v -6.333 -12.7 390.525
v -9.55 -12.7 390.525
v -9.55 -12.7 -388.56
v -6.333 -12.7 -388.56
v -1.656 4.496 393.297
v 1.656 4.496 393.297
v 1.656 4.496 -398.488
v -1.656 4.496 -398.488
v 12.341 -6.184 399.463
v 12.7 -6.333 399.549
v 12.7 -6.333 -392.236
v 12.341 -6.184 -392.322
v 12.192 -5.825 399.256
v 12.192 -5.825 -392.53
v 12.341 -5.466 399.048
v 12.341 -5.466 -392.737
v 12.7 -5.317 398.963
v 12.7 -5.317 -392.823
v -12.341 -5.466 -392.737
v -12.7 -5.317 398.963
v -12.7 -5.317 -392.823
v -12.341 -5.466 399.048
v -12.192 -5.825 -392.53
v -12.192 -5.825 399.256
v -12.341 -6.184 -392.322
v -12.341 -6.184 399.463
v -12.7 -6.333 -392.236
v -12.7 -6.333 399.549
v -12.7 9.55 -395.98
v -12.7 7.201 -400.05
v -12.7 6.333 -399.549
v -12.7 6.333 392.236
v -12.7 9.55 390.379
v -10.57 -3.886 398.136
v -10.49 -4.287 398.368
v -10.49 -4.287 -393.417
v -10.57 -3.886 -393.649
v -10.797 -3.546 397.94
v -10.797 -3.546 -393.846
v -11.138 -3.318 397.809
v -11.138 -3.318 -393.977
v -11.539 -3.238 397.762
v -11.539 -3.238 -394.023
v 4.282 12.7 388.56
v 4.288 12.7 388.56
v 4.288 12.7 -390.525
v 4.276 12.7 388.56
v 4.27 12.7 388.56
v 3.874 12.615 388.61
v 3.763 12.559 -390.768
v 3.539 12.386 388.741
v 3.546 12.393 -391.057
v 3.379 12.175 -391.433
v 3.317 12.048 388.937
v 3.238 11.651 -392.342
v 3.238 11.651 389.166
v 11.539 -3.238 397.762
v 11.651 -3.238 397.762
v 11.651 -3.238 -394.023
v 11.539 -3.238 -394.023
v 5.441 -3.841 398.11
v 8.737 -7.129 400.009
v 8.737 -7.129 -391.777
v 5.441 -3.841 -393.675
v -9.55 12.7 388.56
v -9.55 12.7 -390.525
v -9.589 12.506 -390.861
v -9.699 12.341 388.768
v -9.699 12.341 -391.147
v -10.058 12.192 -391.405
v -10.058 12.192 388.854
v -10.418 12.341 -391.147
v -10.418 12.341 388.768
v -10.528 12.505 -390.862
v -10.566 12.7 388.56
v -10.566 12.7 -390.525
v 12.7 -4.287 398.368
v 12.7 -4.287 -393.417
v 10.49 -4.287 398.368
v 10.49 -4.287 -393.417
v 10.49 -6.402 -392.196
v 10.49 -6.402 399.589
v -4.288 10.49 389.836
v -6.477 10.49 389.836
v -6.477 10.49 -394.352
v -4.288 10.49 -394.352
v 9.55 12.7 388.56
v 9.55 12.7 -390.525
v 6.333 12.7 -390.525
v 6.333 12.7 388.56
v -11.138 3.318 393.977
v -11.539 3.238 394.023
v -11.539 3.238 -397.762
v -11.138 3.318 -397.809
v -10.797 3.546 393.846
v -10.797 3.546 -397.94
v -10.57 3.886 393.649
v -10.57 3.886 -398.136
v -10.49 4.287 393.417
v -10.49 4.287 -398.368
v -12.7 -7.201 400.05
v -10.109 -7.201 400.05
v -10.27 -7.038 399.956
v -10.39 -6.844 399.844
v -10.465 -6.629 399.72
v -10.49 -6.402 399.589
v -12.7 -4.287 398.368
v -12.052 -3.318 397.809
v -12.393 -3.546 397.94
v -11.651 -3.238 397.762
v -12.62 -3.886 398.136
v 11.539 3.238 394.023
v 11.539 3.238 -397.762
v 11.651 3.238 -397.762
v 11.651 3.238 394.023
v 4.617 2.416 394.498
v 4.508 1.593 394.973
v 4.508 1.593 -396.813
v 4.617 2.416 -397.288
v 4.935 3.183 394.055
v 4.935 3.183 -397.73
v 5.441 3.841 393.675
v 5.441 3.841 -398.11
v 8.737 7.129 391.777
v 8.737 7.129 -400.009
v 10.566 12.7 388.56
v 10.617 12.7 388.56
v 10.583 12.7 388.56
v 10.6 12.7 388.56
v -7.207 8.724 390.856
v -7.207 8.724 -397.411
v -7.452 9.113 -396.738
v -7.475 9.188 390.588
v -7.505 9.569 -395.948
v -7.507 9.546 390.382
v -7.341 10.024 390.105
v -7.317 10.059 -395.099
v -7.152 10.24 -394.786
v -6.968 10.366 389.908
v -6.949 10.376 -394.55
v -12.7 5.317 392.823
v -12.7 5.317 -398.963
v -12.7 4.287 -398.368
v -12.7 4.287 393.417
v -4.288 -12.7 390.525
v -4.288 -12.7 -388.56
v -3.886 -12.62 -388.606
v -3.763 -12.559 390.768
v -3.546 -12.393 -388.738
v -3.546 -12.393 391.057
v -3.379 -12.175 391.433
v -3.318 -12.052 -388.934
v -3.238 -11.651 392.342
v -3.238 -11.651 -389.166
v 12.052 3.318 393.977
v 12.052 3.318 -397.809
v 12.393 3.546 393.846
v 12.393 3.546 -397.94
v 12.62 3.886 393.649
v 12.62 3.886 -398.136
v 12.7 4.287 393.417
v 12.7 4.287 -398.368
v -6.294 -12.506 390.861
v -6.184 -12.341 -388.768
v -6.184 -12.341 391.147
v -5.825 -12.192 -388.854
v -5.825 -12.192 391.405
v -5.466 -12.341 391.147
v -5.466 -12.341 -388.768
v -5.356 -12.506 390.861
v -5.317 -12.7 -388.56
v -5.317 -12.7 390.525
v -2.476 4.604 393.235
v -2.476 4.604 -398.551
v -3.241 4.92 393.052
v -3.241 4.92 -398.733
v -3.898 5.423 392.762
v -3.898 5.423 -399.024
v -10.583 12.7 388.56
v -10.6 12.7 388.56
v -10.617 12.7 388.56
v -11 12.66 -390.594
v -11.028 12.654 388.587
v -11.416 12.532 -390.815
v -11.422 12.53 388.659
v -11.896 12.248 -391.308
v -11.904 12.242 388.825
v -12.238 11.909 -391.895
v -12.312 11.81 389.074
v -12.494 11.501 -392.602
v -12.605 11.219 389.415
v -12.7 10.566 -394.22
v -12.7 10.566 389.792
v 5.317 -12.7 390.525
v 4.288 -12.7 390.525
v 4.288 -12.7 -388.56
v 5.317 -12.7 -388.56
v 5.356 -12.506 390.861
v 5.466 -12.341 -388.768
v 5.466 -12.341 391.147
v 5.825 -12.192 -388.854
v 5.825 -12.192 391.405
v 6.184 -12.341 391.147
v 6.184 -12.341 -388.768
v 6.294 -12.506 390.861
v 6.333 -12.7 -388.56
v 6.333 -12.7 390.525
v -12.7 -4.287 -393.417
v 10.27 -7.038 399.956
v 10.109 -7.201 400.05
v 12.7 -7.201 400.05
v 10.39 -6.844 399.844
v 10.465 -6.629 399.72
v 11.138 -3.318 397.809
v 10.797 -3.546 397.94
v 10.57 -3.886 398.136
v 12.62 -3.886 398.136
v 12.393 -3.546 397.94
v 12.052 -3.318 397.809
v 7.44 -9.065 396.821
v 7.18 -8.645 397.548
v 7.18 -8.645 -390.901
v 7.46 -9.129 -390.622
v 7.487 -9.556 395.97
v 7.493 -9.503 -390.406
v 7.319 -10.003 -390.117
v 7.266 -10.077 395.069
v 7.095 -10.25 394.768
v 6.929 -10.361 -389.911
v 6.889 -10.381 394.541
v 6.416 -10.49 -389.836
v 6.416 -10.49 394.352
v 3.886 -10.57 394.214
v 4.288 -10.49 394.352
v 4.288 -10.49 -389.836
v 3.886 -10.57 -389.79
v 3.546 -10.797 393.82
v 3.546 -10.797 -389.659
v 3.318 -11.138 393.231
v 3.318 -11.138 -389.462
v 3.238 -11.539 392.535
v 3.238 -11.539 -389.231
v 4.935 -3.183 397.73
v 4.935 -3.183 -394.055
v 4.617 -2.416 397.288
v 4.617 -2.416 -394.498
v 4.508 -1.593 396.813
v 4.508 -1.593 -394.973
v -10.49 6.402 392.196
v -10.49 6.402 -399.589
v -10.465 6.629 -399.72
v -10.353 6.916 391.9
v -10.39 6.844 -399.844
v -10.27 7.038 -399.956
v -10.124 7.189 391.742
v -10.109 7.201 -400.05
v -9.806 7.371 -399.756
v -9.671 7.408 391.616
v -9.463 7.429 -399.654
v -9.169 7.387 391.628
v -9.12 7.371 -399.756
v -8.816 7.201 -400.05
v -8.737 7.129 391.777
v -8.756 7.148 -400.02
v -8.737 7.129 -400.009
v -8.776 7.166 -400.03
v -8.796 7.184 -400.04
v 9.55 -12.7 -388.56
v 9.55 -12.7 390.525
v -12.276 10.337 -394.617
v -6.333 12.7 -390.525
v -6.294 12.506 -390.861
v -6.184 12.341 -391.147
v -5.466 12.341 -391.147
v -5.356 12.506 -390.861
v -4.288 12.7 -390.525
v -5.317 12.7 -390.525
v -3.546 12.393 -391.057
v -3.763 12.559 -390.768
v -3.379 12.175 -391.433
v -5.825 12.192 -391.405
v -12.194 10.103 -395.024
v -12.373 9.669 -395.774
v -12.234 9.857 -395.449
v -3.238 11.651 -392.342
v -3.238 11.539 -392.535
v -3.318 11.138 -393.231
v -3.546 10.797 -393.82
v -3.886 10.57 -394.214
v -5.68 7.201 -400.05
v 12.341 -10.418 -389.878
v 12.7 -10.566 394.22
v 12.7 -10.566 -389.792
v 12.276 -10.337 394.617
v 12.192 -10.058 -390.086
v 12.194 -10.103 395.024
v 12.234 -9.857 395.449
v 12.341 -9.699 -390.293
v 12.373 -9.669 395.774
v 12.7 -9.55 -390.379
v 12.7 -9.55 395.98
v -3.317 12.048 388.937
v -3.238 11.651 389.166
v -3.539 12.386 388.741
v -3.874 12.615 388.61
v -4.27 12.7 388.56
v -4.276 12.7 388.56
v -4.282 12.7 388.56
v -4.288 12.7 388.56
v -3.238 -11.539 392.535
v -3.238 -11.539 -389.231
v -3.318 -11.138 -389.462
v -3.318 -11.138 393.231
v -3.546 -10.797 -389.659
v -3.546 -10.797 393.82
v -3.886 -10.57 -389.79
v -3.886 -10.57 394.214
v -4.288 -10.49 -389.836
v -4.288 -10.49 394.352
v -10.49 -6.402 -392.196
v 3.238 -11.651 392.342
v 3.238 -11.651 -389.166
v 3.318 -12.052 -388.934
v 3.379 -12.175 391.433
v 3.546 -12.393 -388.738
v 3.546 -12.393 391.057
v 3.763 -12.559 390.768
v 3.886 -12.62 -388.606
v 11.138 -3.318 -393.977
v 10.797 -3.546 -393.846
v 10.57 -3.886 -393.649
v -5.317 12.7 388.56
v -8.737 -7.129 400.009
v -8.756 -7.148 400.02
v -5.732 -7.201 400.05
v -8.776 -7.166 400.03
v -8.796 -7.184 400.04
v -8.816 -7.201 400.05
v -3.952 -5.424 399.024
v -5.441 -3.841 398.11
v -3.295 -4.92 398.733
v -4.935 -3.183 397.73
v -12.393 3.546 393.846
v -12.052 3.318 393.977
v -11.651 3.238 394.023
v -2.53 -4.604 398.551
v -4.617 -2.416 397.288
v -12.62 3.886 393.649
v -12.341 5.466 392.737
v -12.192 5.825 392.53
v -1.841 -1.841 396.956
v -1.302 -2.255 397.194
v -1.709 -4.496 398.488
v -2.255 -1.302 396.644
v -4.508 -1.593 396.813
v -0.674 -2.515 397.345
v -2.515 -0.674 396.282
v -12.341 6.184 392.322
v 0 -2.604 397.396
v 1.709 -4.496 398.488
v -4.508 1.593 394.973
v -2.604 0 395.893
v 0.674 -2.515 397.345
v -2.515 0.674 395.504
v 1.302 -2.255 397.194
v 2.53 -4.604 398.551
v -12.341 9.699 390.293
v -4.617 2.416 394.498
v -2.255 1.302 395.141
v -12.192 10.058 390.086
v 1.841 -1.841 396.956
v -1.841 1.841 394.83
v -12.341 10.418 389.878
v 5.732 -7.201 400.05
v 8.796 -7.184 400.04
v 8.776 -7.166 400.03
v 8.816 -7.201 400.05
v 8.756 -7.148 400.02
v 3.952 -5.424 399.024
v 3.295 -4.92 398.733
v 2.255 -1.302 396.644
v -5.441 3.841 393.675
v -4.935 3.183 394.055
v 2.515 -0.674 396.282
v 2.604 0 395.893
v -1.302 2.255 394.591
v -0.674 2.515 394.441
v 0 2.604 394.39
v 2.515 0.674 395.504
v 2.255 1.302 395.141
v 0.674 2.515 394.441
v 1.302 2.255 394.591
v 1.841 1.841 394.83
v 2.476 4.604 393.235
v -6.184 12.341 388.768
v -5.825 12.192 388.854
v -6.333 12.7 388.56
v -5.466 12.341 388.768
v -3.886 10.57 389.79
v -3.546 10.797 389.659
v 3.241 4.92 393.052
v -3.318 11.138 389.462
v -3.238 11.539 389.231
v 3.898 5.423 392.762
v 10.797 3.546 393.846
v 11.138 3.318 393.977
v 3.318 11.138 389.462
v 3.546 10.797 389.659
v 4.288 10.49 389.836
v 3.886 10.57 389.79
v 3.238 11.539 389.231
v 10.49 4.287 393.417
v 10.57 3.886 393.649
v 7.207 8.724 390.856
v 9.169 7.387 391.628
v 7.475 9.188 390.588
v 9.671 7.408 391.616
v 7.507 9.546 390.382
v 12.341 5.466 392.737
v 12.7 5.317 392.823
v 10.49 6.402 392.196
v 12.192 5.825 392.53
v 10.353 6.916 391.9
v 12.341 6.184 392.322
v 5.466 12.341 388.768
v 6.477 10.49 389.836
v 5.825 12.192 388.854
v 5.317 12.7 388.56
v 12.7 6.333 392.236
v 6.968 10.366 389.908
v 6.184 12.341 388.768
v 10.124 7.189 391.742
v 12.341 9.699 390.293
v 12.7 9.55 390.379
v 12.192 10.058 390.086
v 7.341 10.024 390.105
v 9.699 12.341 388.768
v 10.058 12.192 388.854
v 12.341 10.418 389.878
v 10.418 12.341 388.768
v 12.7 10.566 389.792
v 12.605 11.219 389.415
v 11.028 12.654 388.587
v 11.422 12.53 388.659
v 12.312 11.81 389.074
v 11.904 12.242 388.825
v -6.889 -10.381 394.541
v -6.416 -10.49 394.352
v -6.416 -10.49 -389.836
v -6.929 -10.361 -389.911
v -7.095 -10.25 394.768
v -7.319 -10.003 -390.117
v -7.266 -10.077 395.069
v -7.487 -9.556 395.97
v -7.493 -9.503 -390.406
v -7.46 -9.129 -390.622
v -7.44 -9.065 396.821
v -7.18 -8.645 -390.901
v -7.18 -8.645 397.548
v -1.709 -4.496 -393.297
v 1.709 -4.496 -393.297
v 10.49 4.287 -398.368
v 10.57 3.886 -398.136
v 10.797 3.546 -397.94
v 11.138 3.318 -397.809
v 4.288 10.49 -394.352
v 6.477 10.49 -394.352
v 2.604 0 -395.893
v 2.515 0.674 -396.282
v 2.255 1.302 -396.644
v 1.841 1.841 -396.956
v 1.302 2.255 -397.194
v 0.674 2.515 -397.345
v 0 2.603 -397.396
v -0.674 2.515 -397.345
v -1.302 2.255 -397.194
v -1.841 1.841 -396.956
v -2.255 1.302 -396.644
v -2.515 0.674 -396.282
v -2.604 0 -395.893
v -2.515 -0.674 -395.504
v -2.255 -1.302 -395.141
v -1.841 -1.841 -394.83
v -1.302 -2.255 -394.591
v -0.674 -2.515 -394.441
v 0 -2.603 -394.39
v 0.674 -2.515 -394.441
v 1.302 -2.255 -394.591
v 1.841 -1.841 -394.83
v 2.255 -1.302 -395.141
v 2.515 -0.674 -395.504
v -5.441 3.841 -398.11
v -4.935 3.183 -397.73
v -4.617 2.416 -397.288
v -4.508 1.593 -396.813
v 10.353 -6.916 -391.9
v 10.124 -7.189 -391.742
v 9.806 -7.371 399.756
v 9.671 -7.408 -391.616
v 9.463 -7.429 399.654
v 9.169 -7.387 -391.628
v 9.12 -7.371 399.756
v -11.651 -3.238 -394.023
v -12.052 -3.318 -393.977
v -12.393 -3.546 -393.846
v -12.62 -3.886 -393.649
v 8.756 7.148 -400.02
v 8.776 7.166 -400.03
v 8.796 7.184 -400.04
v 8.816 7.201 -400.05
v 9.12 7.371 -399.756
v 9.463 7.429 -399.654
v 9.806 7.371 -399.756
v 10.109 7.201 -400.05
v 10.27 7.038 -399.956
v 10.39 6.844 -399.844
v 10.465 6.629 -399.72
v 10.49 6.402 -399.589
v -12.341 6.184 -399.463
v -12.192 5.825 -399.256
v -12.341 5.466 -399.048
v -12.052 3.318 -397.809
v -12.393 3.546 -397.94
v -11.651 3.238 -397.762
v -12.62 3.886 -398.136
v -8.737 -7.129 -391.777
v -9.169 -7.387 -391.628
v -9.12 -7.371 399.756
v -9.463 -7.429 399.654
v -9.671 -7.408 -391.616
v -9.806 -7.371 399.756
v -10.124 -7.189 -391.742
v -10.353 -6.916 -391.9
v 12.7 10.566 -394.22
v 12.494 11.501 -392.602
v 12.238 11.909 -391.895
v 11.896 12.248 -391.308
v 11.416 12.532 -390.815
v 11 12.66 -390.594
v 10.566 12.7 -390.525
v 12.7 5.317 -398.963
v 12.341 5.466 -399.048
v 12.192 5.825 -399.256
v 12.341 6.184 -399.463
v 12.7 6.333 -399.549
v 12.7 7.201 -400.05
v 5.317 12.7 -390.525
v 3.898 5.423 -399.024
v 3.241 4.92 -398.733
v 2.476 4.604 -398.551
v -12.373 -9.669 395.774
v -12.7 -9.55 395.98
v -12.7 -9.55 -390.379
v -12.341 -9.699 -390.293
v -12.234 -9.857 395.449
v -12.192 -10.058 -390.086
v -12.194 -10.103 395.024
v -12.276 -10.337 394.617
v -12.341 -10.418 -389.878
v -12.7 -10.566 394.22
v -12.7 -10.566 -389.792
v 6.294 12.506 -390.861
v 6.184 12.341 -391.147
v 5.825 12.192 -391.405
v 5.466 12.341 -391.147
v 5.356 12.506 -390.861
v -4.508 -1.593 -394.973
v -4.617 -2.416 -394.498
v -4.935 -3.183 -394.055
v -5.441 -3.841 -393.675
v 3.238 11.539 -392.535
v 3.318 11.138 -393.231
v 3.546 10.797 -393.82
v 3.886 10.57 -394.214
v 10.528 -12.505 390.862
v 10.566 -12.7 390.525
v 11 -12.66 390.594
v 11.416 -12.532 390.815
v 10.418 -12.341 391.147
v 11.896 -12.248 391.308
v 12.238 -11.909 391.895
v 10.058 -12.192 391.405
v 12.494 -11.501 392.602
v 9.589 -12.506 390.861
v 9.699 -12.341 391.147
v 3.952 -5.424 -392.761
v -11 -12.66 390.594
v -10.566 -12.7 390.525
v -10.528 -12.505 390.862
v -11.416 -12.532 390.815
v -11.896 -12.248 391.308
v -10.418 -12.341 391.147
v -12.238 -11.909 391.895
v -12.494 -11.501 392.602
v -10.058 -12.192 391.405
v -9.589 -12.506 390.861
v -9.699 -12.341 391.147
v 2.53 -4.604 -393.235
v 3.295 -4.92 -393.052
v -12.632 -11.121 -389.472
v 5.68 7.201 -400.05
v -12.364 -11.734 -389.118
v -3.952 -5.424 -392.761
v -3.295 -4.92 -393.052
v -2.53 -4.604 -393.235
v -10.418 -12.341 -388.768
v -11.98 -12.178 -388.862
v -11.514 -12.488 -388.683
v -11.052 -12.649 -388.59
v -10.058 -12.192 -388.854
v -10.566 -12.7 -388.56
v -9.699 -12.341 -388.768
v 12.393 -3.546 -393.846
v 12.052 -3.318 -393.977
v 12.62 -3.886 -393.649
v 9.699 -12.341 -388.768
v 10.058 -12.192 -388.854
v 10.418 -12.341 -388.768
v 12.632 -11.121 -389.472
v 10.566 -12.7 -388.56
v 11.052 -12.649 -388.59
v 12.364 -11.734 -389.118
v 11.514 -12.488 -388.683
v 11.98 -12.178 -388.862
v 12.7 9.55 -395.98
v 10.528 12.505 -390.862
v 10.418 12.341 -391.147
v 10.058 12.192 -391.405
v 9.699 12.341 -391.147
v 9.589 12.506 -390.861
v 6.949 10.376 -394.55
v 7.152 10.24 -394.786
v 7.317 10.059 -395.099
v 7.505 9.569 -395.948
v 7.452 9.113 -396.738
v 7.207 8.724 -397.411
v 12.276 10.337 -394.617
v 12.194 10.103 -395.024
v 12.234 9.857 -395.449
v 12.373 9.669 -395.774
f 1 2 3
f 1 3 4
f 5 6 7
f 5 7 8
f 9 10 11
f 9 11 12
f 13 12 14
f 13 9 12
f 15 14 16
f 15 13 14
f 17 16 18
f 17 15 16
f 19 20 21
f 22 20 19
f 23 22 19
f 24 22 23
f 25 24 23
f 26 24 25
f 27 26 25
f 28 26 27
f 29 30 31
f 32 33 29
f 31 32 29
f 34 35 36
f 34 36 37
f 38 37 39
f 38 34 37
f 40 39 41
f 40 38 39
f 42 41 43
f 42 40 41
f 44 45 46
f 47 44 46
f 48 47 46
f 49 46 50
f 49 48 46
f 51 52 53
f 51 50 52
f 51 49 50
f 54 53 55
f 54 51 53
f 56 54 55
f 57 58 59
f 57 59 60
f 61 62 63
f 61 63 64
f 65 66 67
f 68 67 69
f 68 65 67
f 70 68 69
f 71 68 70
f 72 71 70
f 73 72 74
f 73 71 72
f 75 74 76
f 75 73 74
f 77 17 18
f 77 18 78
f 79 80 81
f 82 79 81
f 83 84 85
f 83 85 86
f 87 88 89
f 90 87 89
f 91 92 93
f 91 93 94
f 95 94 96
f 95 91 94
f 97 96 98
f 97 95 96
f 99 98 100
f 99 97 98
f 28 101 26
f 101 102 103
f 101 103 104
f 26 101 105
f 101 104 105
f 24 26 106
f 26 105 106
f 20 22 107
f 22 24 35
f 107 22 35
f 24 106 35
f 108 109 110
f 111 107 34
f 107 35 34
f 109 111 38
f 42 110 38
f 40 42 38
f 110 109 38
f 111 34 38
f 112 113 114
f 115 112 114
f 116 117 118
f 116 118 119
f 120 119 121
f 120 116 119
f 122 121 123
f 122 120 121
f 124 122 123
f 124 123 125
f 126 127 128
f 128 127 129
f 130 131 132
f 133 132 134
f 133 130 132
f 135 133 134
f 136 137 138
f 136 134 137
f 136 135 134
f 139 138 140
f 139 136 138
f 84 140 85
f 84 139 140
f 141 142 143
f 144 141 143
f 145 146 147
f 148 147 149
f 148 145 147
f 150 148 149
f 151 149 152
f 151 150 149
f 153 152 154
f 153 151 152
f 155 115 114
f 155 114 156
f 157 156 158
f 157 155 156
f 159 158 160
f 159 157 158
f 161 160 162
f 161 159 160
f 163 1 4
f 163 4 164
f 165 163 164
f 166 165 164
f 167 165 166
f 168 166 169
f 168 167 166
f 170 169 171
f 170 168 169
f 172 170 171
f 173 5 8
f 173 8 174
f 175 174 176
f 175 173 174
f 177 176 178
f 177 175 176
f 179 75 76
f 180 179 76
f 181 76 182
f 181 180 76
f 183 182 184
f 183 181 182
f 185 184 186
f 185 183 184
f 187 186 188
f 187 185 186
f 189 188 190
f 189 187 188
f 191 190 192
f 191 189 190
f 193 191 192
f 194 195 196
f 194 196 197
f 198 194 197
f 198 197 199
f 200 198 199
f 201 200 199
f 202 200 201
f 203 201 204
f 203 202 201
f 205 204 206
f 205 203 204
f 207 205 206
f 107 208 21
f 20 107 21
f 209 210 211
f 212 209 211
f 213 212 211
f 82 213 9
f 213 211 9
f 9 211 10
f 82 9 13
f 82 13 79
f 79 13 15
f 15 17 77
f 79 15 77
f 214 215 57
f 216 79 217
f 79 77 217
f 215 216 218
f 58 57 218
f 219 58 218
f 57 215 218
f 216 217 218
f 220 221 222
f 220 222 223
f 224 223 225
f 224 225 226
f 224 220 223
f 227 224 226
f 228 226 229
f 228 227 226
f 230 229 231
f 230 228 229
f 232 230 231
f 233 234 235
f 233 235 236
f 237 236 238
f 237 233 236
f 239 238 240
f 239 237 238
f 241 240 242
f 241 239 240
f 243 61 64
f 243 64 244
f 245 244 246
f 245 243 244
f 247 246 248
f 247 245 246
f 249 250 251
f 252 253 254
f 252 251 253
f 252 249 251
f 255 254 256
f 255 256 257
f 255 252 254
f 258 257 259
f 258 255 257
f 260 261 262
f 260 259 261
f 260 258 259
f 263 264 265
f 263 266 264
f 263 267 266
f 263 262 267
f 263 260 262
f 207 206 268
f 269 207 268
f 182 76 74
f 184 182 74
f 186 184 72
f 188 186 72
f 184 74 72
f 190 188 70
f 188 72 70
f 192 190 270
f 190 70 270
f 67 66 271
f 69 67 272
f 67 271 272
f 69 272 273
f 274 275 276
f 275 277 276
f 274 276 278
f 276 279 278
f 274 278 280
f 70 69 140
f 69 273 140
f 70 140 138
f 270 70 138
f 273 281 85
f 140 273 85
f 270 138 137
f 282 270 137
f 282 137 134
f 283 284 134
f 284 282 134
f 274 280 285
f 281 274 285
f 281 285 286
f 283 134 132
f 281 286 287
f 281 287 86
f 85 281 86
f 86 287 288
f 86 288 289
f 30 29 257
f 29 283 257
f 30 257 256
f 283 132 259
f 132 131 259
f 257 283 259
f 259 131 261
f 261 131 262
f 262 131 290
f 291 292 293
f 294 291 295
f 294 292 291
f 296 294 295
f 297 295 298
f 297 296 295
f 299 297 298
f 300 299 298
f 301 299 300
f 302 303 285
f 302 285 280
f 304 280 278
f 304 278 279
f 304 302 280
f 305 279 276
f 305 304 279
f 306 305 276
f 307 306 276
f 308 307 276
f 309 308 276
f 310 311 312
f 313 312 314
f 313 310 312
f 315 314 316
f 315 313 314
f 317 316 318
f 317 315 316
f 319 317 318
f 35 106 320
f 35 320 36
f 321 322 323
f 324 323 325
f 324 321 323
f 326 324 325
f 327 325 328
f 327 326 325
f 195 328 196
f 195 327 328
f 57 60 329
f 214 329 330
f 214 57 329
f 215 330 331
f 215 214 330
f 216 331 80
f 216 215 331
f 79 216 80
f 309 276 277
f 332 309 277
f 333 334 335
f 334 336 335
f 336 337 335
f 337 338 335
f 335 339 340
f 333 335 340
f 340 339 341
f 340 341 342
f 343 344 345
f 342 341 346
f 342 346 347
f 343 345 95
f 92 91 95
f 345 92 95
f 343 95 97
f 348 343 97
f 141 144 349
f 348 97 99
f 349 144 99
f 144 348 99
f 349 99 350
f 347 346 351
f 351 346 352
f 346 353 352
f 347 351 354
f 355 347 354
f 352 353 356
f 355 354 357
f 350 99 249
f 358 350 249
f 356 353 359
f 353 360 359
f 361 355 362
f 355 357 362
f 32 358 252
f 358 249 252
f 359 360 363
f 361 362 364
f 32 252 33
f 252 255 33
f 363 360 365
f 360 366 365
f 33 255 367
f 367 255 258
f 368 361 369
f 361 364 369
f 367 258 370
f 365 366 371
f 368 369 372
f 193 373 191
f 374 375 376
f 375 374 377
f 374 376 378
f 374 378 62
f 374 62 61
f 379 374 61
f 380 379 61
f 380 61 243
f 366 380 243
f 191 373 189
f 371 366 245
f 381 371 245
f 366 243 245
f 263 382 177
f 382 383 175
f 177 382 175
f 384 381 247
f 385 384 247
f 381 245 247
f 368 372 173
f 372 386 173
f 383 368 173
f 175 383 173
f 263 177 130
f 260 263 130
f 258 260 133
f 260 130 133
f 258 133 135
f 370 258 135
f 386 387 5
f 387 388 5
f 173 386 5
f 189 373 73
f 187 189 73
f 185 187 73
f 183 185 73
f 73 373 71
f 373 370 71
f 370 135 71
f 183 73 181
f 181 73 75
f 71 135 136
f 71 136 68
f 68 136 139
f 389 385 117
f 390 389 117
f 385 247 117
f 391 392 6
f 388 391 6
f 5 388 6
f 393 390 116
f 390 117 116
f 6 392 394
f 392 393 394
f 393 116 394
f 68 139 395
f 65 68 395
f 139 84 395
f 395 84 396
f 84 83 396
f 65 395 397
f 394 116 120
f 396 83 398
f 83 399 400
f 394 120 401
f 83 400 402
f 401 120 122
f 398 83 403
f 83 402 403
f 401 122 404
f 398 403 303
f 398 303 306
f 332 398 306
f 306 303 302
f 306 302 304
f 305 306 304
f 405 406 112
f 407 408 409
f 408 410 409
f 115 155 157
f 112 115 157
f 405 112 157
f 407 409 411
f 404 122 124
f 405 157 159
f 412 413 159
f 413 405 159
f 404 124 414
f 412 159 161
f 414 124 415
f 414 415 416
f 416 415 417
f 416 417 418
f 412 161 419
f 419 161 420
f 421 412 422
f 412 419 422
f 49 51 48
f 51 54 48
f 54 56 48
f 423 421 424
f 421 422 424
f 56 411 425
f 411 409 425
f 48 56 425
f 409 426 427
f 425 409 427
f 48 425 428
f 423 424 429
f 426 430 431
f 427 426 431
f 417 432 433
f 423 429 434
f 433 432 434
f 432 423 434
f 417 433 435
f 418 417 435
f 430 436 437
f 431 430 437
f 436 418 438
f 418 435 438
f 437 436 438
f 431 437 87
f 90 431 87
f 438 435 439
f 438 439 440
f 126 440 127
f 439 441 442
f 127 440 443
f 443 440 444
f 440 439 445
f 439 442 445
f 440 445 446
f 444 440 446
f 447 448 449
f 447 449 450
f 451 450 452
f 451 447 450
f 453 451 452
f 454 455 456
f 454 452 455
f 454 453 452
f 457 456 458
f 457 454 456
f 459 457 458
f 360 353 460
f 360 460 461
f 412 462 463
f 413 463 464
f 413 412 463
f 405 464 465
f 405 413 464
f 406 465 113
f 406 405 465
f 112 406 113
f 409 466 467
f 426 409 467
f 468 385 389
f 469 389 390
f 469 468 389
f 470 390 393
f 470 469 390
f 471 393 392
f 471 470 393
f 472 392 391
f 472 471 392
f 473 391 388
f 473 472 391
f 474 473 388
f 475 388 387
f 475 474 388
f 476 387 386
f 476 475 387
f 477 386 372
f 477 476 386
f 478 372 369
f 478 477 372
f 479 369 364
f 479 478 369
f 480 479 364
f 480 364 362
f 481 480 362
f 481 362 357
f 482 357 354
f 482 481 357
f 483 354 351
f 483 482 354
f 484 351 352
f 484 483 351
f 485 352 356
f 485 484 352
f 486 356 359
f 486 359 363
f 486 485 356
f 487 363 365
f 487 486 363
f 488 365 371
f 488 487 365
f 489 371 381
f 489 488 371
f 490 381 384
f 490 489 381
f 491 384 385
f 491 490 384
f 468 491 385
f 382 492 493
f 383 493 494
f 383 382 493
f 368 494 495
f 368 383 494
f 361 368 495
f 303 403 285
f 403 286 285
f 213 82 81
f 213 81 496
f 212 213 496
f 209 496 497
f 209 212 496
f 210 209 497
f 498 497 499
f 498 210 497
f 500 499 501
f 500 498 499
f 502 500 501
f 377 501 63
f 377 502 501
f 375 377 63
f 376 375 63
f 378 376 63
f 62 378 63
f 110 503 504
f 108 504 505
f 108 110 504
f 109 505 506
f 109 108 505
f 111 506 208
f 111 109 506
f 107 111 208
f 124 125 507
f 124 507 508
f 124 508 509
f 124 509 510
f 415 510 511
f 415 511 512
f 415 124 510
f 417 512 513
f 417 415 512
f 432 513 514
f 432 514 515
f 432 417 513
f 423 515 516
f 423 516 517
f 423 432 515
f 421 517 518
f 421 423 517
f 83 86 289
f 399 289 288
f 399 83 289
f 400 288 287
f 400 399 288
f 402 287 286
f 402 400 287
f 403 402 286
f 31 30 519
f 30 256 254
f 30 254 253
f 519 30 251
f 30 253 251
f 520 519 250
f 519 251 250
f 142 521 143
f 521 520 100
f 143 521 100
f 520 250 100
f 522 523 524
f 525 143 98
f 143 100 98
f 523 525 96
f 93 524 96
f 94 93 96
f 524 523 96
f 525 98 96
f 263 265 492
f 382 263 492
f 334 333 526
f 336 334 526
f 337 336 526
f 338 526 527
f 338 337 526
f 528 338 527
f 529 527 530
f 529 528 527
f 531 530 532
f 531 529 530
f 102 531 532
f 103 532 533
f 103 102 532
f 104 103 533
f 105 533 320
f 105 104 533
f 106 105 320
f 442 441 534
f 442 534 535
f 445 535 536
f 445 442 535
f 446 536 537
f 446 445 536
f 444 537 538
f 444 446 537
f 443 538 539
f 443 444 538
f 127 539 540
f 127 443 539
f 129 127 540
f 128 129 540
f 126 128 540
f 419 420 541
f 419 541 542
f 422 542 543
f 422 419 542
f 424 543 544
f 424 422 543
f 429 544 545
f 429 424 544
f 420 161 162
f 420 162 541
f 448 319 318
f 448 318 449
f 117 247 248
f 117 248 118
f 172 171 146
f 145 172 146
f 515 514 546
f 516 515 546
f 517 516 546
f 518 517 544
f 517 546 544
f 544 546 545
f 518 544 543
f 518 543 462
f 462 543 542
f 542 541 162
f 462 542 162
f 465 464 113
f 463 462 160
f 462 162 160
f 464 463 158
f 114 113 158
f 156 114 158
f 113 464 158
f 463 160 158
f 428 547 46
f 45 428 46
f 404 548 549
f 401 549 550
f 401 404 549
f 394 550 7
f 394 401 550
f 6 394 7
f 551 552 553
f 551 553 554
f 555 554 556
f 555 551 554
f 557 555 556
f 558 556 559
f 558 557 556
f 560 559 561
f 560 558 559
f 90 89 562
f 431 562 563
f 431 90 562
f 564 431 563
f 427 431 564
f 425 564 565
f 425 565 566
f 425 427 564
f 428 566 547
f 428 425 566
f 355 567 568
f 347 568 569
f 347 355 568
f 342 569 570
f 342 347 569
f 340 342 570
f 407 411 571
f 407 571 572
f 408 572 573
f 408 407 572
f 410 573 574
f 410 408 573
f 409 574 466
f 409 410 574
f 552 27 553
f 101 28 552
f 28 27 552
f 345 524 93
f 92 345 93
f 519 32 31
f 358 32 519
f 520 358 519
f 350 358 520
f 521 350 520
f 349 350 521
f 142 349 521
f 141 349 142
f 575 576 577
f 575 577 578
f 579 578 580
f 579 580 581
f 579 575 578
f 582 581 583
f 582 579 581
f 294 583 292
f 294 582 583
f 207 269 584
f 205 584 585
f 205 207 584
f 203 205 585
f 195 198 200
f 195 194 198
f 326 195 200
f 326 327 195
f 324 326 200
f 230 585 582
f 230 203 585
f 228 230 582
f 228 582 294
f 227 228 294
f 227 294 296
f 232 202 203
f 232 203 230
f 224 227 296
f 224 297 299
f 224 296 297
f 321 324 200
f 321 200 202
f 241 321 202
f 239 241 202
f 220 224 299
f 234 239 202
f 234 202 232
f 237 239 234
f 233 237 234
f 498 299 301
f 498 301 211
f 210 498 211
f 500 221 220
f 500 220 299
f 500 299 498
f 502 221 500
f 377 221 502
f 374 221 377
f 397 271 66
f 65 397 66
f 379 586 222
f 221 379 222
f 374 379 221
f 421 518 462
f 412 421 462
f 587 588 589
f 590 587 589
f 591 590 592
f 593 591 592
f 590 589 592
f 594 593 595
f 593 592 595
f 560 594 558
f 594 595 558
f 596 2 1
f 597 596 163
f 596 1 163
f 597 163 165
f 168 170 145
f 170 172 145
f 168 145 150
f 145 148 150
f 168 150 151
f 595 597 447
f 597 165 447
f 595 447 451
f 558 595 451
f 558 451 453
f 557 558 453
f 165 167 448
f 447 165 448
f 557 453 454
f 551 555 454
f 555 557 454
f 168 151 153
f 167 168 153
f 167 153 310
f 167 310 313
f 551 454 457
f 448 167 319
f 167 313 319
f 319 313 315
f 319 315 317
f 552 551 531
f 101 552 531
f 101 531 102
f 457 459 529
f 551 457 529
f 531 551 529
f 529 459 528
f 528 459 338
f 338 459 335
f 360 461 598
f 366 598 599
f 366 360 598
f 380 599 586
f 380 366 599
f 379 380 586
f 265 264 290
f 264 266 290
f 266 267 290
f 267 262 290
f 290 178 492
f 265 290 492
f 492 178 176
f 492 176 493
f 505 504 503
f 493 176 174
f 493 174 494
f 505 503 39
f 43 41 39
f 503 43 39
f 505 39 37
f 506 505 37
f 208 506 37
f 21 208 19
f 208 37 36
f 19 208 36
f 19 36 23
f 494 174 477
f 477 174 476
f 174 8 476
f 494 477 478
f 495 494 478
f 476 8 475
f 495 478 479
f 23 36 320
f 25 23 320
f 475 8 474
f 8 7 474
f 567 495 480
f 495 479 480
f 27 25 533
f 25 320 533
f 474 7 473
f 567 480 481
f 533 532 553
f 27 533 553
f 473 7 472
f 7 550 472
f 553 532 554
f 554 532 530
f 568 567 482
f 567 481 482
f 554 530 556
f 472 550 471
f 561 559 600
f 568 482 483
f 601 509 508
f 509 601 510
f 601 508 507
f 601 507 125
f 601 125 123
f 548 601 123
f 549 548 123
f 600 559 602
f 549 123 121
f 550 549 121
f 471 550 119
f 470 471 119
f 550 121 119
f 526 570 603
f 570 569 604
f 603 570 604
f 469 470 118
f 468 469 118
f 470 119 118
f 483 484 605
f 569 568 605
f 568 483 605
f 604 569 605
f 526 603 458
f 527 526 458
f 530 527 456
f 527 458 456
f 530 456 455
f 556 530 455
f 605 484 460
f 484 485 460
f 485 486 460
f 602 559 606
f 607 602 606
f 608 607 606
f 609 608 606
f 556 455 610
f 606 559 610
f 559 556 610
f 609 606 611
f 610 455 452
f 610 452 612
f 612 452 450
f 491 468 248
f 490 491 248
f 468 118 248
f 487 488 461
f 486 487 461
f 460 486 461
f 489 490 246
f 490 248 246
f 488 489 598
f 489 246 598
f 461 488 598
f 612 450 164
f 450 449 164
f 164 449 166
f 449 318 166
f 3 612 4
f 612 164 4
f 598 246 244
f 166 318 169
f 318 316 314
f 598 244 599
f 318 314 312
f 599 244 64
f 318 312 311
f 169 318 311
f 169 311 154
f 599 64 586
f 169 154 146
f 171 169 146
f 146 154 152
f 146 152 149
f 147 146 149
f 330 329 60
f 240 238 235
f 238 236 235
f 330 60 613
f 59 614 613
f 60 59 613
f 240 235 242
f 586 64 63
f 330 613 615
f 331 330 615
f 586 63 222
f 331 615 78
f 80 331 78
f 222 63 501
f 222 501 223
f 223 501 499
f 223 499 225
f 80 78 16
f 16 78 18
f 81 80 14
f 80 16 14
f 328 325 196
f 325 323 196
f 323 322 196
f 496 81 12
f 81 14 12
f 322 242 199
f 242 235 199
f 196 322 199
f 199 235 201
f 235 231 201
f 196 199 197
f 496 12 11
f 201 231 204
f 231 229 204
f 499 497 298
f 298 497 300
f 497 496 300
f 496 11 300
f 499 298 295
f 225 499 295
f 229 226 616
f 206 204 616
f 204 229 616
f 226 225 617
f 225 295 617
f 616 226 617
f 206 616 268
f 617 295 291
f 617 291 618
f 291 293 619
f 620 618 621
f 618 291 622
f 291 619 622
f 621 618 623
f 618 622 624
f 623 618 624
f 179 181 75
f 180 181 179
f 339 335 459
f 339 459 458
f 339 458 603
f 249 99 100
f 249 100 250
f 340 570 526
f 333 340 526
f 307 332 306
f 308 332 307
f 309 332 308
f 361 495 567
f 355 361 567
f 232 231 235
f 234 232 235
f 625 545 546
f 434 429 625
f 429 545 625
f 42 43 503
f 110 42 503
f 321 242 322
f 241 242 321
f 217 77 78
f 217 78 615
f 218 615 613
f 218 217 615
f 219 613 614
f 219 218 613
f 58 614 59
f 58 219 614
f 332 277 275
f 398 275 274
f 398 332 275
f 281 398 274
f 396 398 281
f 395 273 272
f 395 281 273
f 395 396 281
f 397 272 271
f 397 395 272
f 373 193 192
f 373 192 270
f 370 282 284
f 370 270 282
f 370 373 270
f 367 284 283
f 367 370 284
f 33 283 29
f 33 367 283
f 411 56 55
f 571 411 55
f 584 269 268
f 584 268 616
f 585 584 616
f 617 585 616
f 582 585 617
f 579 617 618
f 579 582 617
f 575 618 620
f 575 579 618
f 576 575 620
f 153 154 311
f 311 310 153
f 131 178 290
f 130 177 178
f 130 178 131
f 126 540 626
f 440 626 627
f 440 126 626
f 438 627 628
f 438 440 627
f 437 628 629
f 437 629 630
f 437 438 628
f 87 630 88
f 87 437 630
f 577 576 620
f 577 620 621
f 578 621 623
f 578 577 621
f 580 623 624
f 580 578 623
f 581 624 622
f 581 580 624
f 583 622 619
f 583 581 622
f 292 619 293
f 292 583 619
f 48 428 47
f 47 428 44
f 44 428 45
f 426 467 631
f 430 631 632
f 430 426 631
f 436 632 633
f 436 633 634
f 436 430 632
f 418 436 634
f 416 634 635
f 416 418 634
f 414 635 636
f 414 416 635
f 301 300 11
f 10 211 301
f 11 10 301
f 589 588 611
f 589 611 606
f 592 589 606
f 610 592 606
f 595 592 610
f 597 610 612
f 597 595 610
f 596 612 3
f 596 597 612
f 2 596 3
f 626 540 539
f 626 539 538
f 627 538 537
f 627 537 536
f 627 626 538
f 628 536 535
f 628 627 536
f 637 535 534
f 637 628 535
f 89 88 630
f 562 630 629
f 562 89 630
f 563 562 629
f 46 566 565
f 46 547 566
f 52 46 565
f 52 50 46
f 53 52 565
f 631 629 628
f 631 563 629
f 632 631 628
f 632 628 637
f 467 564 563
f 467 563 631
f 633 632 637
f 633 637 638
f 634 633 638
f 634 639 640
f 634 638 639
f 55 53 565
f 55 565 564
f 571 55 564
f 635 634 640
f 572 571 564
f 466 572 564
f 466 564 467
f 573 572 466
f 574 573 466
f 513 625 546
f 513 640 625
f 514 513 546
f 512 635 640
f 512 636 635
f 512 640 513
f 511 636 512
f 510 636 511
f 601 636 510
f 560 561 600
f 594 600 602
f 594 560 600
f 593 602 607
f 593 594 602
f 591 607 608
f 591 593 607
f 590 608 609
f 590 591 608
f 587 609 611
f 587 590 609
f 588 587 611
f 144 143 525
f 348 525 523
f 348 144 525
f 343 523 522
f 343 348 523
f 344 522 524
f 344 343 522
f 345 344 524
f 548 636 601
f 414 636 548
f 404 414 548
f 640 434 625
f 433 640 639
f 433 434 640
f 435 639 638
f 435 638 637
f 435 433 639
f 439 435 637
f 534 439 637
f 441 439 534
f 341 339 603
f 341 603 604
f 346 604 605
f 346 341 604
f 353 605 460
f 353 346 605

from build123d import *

# Parameters (mm, degrees)
SKETCH1_R                    = 2.6035
BOSS_EXTRUDE1_DEPTH          = 403.225
F_30_DEG_END_TRIM_DEPTH      = 13.7
F_30_DEG_END_TRIM_DEPTH_BACK = 13.7
TRIM_TO_FIT_DEPTH            = 13.7
TRIM_TO_FIT_DEPTH_BACK       = 13.7


with BuildPart() as part:
    # Sketch1 → Boss-Extrude1 (new body, symmetric)
    with BuildSketch(Plane.XY):
        with BuildLine():
            Line((-7.179650497, -8.645192506), (-3.952270251, -5.423690499))
            ThreePointArc((-3.952270251, -5.423690499), (-2.922936451, -4.736929036), (-1.709253557, -4.4958))
            Line((-1.709253557, -4.4958), (1.709253557, -4.4958))
            ThreePointArc((1.709253557, -4.4958), (2.922936451, -4.736929036), (3.952270251, -5.423690499))
            Line((3.952270251, -5.423690499), (7.179650497, -8.645192506))
            ThreePointArc((7.179650497, -8.645192506), (7.41473083, -9.822813117), (6.416408329, -10.4902))
            Line((6.416408329, -10.4902), (4.287512407, -10.4902))
            ThreePointArc((4.287512407, -10.4902), (3.54574862, -10.79744862), (3.2385, -11.539212407))
            Line((3.2385, -11.539212407), (3.2385, -11.650987593))
            ThreePointArc((3.2385, -11.650987593), (3.54574862, -12.39275138), (4.287512407, -12.7))
            Line((4.287512407, -12.7), (5.317126718, -12.7))
            ThreePointArc((5.317126718, -12.7), (5.825126718, -12.192), (6.333126718, -12.7))
            Line((6.333126718, -12.7), (9.550443118, -12.7))
            ThreePointArc((9.550443118, -12.7), (10.058366869, -12.192000006), (10.566443095, -12.699847501))
            ThreePointArc((10.566443095, -12.699847501), (12.082537762, -12.08250727), (12.699846982, -10.566399977))
            ThreePointArc((12.699846982, -10.566399977), (12.192000006, -10.058323491), (12.7, -9.5504))
            Line((12.7, -9.5504), (12.7, -6.3330836))
            ThreePointArc((12.7, -6.3330836), (12.192, -5.8250836), (12.7, -5.3170836))
            Line((12.7, -5.3170836), (12.7, -4.287469289))
            ThreePointArc((12.7, -4.287469289), (12.39275138, -3.545705502), (11.650987593, -3.238456882))
            Line((11.650987593, -3.238456882), (11.539212407, -3.238456882))
            ThreePointArc((11.539212407, -3.238456882), (10.79744862, -3.545705502), (10.4902, -4.287469289))
            Line((10.4902, -4.287469289), (10.4902, -6.402089023))
            ThreePointArc((10.4902, -6.402089023), (9.856505071, -7.351067942), (8.737131347, -7.129408934))
            Line((8.737131347, -7.129408934), (5.441005833, -3.840816462))
            ThreePointArc((5.441005833, -3.840816462), (4.750877967, -2.809883091), (4.5085, -1.593185507))
            Line((4.5085, -1.593185507), (4.5085, 1.593185507))
            ThreePointArc((4.5085, 1.593185507), (4.750877967, 2.809883091), (5.441005833, 3.840816462))
            Line((5.441005833, 3.840816462), (8.737131347, 7.129408934))
            ThreePointArc((8.737131347, 7.129408934), (9.856505071, 7.351067942), (10.4902, 6.402089023))
            Line((10.4902, 6.402089023), (10.4902, 4.287469289))
            ThreePointArc((10.4902, 4.287469289), (10.79744862, 3.545705502), (11.539212407, 3.238456882))
            Line((11.539212407, 3.238456882), (11.650987593, 3.238456882))
            ThreePointArc((11.650987593, 3.238456882), (12.39275138, 3.545705502), (12.7, 4.287469289))
            Line((12.7, 4.287469289), (12.7, 5.3170836))
            ThreePointArc((12.7, 5.3170836), (12.192, 5.8250836), (12.7, 6.3330836))
            Line((12.7, 6.3330836), (12.7, 9.5504))
            ThreePointArc((12.7, 9.5504), (12.192000006, 10.058323491), (12.699846982, 10.566399977))
            ThreePointArc((12.699846982, 10.566399977), (12.082537762, 12.08250727), (10.566443095, 12.699847501))
            ThreePointArc((10.566443095, 12.699847501), (10.058366869, 12.192000006), (9.550443118, 12.7))
            Line((9.550443118, 12.7), (6.333126718, 12.7))
            ThreePointArc((6.333126718, 12.7), (5.825126718, 12.192), (5.317126718, 12.7))
            Line((5.317126718, 12.7), (4.287512407, 12.7))
            ThreePointArc((4.287512407, 12.7), (3.54574862, 12.39275138), (3.2385, 11.650987593))
            Line((3.2385, 11.650987593), (3.2385, 11.539212407))
            ThreePointArc((3.2385, 11.539212407), (3.54574862, 10.79744862), (4.287512407, 10.4902))
            Line((4.287512407, 10.4902), (6.476788598, 10.4902))
            ThreePointArc((6.476788598, 10.4902), (7.432222385, 9.85140422), (7.207036008, 8.724370562))
            Line((7.207036008, 8.724370562), (3.898272566, 5.423169045))
            ThreePointArc((3.898272566, 5.423169045), (2.869120213, 4.736787962), (1.655778399, 4.4958))
            Line((1.655778399, 4.4958), (-1.655778399, 4.4958))
            ThreePointArc((-1.655778399, 4.4958), (-2.869120213, 4.736787962), (-3.898272566, 5.423169045))
            Line((-3.898272566, 5.423169045), (-7.207036008, 8.724370562))
            ThreePointArc((-7.207036008, 8.724370562), (-7.432222385, 9.85140422), (-6.476788598, 10.4902))
            Line((-6.476788598, 10.4902), (-4.287512407, 10.4902))
            ThreePointArc((-4.287512407, 10.4902), (-3.54574862, 10.79744862), (-3.2385, 11.539212407))
            Line((-3.2385, 11.539212407), (-3.2385, 11.650987593))
            ThreePointArc((-3.2385, 11.650987593), (-3.54574862, 12.39275138), (-4.287512407, 12.7))
            Line((-4.287512407, 12.7), (-5.317126718, 12.7))
            ThreePointArc((-5.317126718, 12.7), (-5.825126718, 12.192), (-6.333126718, 12.7))
            Line((-6.333126718, 12.7), (-9.550443118, 12.7))
            ThreePointArc((-9.550443118, 12.7), (-10.058366869, 12.192000006), (-10.566443095, 12.699847501))
            ThreePointArc((-10.566443095, 12.699847501), (-12.082537762, 12.08250727), (-12.699846982, 10.566399977))
            ThreePointArc((-12.699846982, 10.566399977), (-12.192000006, 10.058323491), (-12.7, 9.5504))
            Line((-12.7, 9.5504), (-12.7, 6.3330836))
            ThreePointArc((-12.7, 6.3330836), (-12.192, 5.8250836), (-12.7, 5.3170836))
            Line((-12.7, 5.3170836), (-12.7, 4.287469289))
            ThreePointArc((-12.7, 4.287469289), (-12.39275138, 3.545705502), (-11.650987593, 3.238456882))
            Line((-11.650987593, 3.238456882), (-11.539212407, 3.238456882))
            ThreePointArc((-11.539212407, 3.238456882), (-10.79744862, 3.545705502), (-10.4902, 4.287469289))
            Line((-10.4902, 4.287469289), (-10.4902, 6.402089023))
            ThreePointArc((-10.4902, 6.402089023), (-9.856505071, 7.351067942), (-8.737131347, 7.129408934))
            Line((-8.737131347, 7.129408934), (-5.441005833, 3.840816462))
            ThreePointArc((-5.441005833, 3.840816462), (-4.750877967, 2.809883091), (-4.5085, 1.593185507))
            Line((-4.5085, 1.593185507), (-4.5085, -1.593185507))
            ThreePointArc((-4.5085, -1.593185507), (-4.750877967, -2.809883091), (-5.441005833, -3.840816462))
            Line((-5.441005833, -3.840816462), (-8.737131347, -7.129408934))
            ThreePointArc((-8.737131347, -7.129408934), (-9.856505071, -7.351067942), (-10.4902, -6.402089023))
            Line((-10.4902, -6.402089023), (-10.4902, -4.287469289))
            ThreePointArc((-10.4902, -4.287469289), (-10.79744862, -3.545705502), (-11.539212407, -3.238456882))
            Line((-11.539212407, -3.238456882), (-11.650987593, -3.238456882))
            ThreePointArc((-11.650987593, -3.238456882), (-12.39275138, -3.545705502), (-12.7, -4.287469289))
            Line((-12.7, -4.287469289), (-12.7, -5.3170836))
            ThreePointArc((-12.7, -5.3170836), (-12.192, -5.8250836), (-12.7, -6.3330836))
            Line((-12.7, -6.3330836), (-12.7, -9.5504))
            ThreePointArc((-12.7, -9.5504), (-12.192000006, -10.058323491), (-12.699846982, -10.566399977))
            ThreePointArc((-12.699846982, -10.566399977), (-12.082537762, -12.08250727), (-10.566443095, -12.699847501))
            ThreePointArc((-10.566443095, -12.699847501), (-10.058366869, -12.192000006), (-9.550443118, -12.7))
            Line((-9.550443118, -12.7), (-6.333126718, -12.7))
            ThreePointArc((-6.333126718, -12.7), (-5.825126718, -12.192), (-5.317126718, -12.7))
            Line((-5.317126718, -12.7), (-4.287512407, -12.7))
            ThreePointArc((-4.287512407, -12.7), (-3.54574862, -12.39275138), (-3.2385, -11.650987593))
            Line((-3.2385, -11.650987593), (-3.2385, -11.539212407))
            ThreePointArc((-3.2385, -11.539212407), (-3.54574862, -10.79744862), (-4.287512407, -10.4902))
            Line((-4.287512407, -10.4902), (-6.416408329, -10.4902))
            ThreePointArc((-6.416408329, -10.4902), (-7.41473083, -9.822813117), (-7.179650497, -8.645192506))
        make_face()
        Circle(SKETCH1_R, mode=Mode.SUBTRACT)
    extrude(amount=BOSS_EXTRUDE1_DEPTH, both=True)

    # Sketch2 → 30 Deg End Trim (cut, two sides)
    with BuildSketch(Plane(origin=(0, 0, 0), x_dir=(0, 0, -1), z_dir=(1, 0, 0))) as f_30_deg_end_trim_sk:
        Polygon((-403.225, -12.699847501), (-388.560479253, 12.699847501), (-388.560479253, 30.675819206), (-403.225, 30.675819206), (-403.225, 12.699847501), align=None)
        Polygon((403.225, -12.699847501), (403.225, 12.699847501), (381.811418901, -24.389562935), (391.735479253, -24.391206459), (403.225, -24.391206459), align=None)
    extrude(amount=F_30_DEG_END_TRIM_DEPTH, mode=Mode.SUBTRACT)
    extrude(f_30_deg_end_trim_sk.sketch, amount=-F_30_DEG_END_TRIM_DEPTH_BACK, mode=Mode.SUBTRACT)

    # Sketch3 → Trim to Fit (cut, two sides)
    with BuildSketch(Plane(origin=(0, 0, 0), x_dir=(0, 0, -1), z_dir=(1, 0, 0))) as trim_to_fit_sk:
        Polygon((-402.43125, -5.825770859), (-423.077780638, -5.825770859), (-423.077780638, -25.399847501), (-384.402954744, -25.399847501), (-380.434204744, -18.525770859), align=None)
        Polygon((402.43125, 5.825770859), (411.263329156, 0.726567581), (422.901533851, 20.884529422), (384.402954744, 25.399847501), (380.434204744, 18.525770859), align=None)
    extrude(amount=TRIM_TO_FIT_DEPTH, mode=Mode.SUBTRACT)
    extrude(trim_to_fit_sk.sketch, amount=-TRIM_TO_FIT_DEPTH_BACK, mode=Mode.SUBTRACT)


solid = part.part
